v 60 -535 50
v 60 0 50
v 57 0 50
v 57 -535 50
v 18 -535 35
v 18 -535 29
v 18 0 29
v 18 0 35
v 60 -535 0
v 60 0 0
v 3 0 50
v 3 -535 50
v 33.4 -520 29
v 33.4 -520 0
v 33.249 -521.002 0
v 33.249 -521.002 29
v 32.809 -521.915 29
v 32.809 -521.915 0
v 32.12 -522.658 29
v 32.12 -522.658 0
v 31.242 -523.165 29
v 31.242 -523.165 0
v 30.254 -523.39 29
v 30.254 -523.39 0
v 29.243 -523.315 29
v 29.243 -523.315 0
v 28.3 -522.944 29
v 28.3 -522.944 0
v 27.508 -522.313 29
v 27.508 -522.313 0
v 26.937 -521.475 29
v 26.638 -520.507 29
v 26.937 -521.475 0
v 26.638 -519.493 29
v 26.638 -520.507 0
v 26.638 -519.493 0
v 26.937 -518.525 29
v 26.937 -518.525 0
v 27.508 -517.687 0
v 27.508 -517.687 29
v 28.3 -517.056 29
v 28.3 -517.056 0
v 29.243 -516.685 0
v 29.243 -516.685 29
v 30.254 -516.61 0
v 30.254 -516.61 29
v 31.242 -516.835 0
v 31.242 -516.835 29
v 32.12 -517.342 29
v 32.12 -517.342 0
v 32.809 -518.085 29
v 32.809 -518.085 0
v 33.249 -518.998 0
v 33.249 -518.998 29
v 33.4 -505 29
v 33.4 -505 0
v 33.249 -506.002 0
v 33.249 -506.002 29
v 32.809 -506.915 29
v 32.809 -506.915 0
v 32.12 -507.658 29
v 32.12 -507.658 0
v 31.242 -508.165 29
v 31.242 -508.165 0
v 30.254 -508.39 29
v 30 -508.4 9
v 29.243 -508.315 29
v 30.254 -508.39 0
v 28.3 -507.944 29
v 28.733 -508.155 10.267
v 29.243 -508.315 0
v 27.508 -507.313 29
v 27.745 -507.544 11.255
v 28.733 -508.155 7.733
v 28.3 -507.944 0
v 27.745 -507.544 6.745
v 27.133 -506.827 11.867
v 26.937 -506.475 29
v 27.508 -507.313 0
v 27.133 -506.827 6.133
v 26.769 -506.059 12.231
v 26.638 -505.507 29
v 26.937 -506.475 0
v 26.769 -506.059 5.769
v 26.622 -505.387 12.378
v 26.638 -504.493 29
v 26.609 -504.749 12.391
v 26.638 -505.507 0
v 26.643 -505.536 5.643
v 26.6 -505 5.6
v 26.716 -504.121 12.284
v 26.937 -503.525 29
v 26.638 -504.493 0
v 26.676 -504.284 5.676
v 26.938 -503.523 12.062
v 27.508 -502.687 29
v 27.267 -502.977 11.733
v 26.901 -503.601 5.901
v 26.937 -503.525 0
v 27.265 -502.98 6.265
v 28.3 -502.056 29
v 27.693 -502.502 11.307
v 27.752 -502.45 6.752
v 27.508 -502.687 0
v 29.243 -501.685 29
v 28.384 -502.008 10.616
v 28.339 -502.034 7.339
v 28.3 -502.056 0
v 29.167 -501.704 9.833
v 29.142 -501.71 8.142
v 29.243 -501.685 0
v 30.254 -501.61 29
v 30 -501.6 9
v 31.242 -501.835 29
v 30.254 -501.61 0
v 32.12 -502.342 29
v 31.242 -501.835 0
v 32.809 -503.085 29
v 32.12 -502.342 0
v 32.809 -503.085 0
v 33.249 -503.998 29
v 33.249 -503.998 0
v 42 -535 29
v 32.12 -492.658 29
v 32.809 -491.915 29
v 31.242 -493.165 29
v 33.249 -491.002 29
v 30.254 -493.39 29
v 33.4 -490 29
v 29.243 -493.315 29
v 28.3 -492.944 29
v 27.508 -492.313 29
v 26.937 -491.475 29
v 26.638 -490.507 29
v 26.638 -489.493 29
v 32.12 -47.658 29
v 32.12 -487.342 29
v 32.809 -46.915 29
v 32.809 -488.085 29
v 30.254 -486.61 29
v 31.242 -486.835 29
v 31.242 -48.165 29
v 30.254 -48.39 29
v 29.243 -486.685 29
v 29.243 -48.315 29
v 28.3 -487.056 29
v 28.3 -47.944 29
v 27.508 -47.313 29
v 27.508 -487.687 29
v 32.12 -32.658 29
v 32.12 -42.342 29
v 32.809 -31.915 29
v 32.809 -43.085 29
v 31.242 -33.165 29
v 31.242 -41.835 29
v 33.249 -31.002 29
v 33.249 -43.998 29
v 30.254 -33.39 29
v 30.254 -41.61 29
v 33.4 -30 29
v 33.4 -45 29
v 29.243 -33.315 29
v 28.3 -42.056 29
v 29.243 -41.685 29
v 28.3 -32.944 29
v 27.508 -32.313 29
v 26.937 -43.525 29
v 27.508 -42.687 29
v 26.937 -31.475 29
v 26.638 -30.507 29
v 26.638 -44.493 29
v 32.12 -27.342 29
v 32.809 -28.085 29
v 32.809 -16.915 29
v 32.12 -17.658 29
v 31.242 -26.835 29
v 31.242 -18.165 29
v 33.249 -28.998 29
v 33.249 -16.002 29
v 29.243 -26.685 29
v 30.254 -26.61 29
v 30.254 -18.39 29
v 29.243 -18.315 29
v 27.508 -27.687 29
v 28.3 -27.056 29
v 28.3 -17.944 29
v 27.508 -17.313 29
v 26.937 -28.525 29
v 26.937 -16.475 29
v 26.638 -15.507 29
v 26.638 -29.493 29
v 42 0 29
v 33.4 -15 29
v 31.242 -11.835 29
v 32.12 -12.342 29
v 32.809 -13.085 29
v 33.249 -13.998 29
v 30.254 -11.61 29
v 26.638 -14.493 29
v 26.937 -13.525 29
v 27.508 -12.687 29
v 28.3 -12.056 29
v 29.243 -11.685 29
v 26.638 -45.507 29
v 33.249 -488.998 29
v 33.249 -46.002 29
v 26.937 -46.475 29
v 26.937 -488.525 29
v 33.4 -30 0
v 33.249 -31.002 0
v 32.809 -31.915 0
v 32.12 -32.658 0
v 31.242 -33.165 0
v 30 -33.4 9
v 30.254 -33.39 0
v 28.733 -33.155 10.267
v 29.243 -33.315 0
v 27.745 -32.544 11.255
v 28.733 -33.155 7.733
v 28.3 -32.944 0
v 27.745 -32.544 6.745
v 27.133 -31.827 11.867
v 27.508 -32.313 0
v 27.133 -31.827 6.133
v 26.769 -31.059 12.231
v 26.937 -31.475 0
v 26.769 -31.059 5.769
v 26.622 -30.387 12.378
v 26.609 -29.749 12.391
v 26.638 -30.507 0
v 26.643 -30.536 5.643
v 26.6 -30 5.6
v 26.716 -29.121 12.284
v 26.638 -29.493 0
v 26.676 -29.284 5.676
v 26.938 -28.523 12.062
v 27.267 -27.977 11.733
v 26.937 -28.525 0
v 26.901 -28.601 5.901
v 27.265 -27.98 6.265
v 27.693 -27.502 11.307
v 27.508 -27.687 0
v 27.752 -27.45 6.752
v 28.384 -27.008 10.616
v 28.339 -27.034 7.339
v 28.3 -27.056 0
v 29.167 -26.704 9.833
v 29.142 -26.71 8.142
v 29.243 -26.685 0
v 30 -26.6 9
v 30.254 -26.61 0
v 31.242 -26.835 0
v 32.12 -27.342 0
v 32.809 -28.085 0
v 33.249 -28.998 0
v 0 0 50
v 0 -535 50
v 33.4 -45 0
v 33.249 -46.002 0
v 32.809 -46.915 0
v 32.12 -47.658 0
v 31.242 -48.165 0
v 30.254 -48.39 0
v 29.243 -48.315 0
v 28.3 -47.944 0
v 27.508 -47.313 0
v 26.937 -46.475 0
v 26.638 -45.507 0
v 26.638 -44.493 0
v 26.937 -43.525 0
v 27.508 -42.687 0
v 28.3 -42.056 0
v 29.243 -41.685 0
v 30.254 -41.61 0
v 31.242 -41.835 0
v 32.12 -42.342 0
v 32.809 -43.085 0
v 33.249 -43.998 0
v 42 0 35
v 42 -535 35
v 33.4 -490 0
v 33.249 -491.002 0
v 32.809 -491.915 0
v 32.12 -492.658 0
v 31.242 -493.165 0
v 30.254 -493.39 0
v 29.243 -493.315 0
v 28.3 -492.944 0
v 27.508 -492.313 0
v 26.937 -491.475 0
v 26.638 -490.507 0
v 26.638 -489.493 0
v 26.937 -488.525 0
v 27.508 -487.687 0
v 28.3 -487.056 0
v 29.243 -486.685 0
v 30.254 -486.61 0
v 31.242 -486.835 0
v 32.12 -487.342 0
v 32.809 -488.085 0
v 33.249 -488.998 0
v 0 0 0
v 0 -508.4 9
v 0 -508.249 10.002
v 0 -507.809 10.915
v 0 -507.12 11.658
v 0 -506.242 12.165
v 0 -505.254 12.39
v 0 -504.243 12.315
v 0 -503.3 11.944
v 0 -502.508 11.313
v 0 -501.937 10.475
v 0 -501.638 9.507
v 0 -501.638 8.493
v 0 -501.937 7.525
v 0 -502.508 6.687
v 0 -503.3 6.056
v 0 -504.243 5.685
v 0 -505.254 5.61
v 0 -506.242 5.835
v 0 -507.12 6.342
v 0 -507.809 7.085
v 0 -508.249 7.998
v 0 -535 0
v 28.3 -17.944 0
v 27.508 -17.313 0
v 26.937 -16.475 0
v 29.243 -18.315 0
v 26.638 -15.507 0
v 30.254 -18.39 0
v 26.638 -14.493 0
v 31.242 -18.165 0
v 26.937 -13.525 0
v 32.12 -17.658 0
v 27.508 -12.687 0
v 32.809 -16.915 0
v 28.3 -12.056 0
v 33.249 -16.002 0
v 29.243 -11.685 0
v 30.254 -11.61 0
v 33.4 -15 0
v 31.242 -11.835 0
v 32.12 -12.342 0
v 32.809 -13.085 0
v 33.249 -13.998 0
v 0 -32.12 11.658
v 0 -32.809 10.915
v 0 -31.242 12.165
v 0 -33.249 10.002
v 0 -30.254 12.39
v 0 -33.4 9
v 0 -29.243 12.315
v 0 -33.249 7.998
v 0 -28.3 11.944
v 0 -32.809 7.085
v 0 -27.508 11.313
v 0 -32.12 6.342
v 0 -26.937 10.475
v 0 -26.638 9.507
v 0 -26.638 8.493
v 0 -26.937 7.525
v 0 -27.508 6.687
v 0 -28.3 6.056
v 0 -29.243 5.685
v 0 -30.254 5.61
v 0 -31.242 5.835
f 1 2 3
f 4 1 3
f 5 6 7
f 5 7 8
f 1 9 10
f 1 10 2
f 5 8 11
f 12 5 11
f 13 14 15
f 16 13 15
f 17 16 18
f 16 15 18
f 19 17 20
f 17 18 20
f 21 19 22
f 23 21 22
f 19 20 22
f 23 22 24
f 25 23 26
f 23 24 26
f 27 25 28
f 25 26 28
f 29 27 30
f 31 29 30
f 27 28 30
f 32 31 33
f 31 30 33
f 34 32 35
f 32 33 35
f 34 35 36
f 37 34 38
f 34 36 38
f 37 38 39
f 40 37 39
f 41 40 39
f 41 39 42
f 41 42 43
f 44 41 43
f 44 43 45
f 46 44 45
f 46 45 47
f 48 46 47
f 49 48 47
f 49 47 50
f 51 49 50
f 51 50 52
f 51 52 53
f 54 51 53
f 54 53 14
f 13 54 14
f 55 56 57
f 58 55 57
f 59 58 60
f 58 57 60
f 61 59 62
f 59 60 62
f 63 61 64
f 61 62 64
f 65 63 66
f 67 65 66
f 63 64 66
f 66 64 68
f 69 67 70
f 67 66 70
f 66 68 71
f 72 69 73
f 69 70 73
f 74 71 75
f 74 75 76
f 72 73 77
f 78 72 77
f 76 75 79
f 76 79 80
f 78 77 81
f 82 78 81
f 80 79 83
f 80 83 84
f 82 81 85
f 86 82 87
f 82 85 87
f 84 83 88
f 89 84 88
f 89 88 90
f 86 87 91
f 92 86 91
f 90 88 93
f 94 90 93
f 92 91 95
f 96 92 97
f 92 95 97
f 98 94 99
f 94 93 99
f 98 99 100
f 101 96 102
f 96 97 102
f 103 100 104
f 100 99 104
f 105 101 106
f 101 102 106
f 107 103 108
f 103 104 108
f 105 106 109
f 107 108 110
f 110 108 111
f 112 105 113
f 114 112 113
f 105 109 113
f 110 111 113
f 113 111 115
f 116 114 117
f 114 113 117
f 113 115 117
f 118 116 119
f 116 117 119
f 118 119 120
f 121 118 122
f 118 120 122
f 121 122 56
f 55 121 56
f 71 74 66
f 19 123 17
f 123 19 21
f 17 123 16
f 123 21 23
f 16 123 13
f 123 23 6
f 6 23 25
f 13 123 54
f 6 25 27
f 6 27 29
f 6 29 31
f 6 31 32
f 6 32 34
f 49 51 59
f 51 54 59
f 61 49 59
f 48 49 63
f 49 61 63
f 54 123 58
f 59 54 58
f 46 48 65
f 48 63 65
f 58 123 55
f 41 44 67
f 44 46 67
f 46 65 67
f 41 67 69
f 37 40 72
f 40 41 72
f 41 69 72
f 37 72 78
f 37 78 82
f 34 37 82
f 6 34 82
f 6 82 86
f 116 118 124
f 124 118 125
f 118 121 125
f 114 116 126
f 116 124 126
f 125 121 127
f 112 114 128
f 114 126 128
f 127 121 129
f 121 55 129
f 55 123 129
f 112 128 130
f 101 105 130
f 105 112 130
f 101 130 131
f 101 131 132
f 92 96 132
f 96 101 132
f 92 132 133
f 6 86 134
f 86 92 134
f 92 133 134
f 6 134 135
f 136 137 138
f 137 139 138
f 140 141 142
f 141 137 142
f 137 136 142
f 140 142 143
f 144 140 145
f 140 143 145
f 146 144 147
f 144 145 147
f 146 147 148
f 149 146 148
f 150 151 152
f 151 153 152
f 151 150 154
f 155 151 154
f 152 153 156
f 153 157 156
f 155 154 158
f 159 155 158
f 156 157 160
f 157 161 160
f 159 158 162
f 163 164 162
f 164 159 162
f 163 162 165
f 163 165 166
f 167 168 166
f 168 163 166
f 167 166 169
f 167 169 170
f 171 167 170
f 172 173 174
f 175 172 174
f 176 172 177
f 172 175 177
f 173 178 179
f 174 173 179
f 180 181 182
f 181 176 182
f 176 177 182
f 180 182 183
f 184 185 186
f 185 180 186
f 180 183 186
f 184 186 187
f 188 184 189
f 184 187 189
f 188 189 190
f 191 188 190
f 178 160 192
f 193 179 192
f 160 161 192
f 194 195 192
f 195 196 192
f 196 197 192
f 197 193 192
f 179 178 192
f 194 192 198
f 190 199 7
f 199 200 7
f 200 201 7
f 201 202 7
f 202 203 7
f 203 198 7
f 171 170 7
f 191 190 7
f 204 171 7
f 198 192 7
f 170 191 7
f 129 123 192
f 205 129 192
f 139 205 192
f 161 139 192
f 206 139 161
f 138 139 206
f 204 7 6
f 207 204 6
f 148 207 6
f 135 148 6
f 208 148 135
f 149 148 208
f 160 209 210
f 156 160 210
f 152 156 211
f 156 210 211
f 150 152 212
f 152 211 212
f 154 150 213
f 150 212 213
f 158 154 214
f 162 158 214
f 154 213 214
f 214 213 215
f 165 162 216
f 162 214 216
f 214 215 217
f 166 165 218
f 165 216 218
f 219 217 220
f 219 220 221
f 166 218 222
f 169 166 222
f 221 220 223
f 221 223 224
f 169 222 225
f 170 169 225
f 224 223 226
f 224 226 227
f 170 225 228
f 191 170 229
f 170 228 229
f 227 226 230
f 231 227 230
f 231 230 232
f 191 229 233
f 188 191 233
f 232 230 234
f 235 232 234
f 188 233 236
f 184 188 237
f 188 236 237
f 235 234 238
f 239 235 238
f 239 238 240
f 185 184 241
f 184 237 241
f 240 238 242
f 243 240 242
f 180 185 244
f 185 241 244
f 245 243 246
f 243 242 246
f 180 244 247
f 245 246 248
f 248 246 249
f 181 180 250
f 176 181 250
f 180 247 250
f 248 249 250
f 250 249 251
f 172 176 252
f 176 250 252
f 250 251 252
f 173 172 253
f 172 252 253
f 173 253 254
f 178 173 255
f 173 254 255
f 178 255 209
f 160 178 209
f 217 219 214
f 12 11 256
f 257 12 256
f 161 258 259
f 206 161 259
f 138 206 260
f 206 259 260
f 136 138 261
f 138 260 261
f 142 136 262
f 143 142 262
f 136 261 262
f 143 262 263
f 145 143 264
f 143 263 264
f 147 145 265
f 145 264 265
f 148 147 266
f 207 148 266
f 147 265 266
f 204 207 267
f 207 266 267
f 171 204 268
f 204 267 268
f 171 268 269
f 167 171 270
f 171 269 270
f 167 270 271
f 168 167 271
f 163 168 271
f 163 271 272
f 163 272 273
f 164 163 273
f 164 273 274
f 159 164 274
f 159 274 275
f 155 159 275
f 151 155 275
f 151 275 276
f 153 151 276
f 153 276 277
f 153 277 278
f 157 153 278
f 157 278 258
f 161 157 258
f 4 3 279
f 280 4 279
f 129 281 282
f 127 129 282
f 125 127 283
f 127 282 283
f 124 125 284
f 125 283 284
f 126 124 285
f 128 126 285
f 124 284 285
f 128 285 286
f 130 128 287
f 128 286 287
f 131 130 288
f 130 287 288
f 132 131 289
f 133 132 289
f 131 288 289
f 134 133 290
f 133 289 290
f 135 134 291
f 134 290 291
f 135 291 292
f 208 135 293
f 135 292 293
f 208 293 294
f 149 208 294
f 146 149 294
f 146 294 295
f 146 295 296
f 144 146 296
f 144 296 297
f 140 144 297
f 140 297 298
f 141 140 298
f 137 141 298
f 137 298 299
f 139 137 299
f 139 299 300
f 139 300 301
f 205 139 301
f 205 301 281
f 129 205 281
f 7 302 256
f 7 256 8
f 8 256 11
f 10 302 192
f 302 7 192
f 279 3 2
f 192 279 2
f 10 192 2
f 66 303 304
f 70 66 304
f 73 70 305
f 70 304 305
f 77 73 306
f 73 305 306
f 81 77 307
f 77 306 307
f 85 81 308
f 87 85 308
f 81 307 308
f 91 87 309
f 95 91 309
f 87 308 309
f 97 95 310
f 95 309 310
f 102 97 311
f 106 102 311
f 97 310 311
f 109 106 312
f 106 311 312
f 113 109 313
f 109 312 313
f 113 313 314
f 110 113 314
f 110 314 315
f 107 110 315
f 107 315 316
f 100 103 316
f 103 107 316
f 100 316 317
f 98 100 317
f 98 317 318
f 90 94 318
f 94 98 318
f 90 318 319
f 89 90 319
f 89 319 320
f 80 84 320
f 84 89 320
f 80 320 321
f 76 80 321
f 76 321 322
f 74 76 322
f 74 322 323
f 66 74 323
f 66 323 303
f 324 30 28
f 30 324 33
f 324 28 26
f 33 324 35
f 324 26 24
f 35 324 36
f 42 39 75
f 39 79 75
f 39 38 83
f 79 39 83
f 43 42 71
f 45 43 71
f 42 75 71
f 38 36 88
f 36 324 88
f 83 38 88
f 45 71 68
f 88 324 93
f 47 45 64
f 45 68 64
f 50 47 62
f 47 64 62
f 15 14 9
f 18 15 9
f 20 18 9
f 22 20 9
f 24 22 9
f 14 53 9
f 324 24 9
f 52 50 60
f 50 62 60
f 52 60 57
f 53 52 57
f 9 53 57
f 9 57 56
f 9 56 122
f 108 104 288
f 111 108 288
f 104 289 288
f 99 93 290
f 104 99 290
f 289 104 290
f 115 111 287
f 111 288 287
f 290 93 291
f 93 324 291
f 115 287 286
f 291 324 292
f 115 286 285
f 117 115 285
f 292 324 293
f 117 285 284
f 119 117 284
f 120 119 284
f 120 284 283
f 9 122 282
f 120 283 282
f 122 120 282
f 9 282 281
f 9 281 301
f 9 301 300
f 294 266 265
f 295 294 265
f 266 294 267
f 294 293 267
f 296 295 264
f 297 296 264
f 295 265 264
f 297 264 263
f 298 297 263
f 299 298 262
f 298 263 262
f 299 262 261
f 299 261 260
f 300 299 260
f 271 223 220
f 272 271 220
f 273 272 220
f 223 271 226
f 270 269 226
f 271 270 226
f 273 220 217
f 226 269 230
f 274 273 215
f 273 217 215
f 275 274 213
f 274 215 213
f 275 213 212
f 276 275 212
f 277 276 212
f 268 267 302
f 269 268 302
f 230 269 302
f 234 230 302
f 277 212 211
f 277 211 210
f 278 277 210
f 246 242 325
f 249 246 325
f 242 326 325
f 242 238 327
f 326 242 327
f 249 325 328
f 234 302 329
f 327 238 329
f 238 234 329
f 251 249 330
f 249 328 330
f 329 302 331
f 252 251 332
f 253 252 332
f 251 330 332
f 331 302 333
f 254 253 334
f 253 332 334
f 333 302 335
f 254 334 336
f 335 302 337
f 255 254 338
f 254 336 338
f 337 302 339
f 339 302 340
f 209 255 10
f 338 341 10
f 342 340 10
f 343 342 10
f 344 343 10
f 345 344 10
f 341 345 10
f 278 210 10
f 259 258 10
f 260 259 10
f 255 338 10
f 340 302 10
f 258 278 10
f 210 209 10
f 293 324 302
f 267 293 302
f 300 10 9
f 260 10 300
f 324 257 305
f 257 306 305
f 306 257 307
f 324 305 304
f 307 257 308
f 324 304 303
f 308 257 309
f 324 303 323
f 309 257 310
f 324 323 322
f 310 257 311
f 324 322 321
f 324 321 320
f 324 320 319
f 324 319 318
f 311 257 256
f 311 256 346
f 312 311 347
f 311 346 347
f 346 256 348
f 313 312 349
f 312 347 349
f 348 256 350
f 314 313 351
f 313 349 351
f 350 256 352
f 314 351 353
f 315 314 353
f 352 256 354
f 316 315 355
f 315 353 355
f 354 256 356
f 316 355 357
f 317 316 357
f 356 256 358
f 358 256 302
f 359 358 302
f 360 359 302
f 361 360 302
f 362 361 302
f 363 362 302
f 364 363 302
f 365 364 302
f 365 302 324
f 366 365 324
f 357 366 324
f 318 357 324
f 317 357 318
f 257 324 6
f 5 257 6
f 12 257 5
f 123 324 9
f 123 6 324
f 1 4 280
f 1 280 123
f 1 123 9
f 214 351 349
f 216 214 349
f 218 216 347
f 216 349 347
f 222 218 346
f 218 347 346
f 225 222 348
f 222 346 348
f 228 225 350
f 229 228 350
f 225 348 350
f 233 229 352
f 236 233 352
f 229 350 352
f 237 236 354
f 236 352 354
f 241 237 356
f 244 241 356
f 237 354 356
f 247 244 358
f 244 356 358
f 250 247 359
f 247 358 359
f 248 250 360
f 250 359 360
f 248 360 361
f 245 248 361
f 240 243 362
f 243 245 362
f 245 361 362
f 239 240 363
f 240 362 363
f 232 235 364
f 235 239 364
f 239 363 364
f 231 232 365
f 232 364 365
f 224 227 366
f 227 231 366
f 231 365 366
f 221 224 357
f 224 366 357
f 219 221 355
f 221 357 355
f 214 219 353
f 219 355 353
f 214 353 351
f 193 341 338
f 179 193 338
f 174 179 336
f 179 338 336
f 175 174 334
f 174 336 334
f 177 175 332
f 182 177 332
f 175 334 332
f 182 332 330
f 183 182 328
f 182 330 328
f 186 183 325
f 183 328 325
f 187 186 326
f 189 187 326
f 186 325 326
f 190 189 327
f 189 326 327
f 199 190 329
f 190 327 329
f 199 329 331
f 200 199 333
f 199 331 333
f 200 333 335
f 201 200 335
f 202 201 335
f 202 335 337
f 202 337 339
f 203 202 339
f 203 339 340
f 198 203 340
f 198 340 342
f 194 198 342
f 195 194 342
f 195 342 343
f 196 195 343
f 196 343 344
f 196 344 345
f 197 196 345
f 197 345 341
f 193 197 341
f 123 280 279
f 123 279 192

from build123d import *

# Parameters (mm, degrees)
F1_DEPTH = 535
F2_R     = 3.4
F3_DEPTH = 30
F4_R     = 3.4
F5_DEPTH = 30


with BuildPart() as f1:
    # F0 (on Front) → F1 (new body)
    with BuildSketch(Plane.XZ):
        Polygon((0, 50), (0, 0), (60, 0), (60, 50), (57, 50), (42, 35), (42, 29), (30, 29), (18, 29), (18, 35), (3, 50), align=None)
    extrude(amount=F1_DEPTH)

    # F2 (on face) → F3 (cut)
    with BuildSketch(Plane(origin=(0, 0, 0), x_dir=(1, 0, 0), z_dir=(0, 0, -1))):
        with Locations((30, 520)):
            Circle(F2_R)
        with Locations((30, 505)):
            Circle(F2_R)
        with Locations((30, 490)):
            Circle(F2_R)
        with Locations((30, 45)):
            Circle(F2_R)
        with Locations((30, 30)):
            Circle(F2_R)
        with Locations((30, 15)):
            Circle(F2_R)
    extrude(amount=-F3_DEPTH, mode=Mode.SUBTRACT)

    # F4 (on face) → F5 (cut)
    with BuildSketch(Plane(origin=(0, 0, 0), x_dir=(0, -1, 0), z_dir=(-1, 0, 0))):
        with Locations((30, 9)):
            Circle(F4_R)
        with Locations((505, 9)):
            Circle(F4_R)
    extrude(amount=-F5_DEPTH, mode=Mode.SUBTRACT)


solid = f1.part
